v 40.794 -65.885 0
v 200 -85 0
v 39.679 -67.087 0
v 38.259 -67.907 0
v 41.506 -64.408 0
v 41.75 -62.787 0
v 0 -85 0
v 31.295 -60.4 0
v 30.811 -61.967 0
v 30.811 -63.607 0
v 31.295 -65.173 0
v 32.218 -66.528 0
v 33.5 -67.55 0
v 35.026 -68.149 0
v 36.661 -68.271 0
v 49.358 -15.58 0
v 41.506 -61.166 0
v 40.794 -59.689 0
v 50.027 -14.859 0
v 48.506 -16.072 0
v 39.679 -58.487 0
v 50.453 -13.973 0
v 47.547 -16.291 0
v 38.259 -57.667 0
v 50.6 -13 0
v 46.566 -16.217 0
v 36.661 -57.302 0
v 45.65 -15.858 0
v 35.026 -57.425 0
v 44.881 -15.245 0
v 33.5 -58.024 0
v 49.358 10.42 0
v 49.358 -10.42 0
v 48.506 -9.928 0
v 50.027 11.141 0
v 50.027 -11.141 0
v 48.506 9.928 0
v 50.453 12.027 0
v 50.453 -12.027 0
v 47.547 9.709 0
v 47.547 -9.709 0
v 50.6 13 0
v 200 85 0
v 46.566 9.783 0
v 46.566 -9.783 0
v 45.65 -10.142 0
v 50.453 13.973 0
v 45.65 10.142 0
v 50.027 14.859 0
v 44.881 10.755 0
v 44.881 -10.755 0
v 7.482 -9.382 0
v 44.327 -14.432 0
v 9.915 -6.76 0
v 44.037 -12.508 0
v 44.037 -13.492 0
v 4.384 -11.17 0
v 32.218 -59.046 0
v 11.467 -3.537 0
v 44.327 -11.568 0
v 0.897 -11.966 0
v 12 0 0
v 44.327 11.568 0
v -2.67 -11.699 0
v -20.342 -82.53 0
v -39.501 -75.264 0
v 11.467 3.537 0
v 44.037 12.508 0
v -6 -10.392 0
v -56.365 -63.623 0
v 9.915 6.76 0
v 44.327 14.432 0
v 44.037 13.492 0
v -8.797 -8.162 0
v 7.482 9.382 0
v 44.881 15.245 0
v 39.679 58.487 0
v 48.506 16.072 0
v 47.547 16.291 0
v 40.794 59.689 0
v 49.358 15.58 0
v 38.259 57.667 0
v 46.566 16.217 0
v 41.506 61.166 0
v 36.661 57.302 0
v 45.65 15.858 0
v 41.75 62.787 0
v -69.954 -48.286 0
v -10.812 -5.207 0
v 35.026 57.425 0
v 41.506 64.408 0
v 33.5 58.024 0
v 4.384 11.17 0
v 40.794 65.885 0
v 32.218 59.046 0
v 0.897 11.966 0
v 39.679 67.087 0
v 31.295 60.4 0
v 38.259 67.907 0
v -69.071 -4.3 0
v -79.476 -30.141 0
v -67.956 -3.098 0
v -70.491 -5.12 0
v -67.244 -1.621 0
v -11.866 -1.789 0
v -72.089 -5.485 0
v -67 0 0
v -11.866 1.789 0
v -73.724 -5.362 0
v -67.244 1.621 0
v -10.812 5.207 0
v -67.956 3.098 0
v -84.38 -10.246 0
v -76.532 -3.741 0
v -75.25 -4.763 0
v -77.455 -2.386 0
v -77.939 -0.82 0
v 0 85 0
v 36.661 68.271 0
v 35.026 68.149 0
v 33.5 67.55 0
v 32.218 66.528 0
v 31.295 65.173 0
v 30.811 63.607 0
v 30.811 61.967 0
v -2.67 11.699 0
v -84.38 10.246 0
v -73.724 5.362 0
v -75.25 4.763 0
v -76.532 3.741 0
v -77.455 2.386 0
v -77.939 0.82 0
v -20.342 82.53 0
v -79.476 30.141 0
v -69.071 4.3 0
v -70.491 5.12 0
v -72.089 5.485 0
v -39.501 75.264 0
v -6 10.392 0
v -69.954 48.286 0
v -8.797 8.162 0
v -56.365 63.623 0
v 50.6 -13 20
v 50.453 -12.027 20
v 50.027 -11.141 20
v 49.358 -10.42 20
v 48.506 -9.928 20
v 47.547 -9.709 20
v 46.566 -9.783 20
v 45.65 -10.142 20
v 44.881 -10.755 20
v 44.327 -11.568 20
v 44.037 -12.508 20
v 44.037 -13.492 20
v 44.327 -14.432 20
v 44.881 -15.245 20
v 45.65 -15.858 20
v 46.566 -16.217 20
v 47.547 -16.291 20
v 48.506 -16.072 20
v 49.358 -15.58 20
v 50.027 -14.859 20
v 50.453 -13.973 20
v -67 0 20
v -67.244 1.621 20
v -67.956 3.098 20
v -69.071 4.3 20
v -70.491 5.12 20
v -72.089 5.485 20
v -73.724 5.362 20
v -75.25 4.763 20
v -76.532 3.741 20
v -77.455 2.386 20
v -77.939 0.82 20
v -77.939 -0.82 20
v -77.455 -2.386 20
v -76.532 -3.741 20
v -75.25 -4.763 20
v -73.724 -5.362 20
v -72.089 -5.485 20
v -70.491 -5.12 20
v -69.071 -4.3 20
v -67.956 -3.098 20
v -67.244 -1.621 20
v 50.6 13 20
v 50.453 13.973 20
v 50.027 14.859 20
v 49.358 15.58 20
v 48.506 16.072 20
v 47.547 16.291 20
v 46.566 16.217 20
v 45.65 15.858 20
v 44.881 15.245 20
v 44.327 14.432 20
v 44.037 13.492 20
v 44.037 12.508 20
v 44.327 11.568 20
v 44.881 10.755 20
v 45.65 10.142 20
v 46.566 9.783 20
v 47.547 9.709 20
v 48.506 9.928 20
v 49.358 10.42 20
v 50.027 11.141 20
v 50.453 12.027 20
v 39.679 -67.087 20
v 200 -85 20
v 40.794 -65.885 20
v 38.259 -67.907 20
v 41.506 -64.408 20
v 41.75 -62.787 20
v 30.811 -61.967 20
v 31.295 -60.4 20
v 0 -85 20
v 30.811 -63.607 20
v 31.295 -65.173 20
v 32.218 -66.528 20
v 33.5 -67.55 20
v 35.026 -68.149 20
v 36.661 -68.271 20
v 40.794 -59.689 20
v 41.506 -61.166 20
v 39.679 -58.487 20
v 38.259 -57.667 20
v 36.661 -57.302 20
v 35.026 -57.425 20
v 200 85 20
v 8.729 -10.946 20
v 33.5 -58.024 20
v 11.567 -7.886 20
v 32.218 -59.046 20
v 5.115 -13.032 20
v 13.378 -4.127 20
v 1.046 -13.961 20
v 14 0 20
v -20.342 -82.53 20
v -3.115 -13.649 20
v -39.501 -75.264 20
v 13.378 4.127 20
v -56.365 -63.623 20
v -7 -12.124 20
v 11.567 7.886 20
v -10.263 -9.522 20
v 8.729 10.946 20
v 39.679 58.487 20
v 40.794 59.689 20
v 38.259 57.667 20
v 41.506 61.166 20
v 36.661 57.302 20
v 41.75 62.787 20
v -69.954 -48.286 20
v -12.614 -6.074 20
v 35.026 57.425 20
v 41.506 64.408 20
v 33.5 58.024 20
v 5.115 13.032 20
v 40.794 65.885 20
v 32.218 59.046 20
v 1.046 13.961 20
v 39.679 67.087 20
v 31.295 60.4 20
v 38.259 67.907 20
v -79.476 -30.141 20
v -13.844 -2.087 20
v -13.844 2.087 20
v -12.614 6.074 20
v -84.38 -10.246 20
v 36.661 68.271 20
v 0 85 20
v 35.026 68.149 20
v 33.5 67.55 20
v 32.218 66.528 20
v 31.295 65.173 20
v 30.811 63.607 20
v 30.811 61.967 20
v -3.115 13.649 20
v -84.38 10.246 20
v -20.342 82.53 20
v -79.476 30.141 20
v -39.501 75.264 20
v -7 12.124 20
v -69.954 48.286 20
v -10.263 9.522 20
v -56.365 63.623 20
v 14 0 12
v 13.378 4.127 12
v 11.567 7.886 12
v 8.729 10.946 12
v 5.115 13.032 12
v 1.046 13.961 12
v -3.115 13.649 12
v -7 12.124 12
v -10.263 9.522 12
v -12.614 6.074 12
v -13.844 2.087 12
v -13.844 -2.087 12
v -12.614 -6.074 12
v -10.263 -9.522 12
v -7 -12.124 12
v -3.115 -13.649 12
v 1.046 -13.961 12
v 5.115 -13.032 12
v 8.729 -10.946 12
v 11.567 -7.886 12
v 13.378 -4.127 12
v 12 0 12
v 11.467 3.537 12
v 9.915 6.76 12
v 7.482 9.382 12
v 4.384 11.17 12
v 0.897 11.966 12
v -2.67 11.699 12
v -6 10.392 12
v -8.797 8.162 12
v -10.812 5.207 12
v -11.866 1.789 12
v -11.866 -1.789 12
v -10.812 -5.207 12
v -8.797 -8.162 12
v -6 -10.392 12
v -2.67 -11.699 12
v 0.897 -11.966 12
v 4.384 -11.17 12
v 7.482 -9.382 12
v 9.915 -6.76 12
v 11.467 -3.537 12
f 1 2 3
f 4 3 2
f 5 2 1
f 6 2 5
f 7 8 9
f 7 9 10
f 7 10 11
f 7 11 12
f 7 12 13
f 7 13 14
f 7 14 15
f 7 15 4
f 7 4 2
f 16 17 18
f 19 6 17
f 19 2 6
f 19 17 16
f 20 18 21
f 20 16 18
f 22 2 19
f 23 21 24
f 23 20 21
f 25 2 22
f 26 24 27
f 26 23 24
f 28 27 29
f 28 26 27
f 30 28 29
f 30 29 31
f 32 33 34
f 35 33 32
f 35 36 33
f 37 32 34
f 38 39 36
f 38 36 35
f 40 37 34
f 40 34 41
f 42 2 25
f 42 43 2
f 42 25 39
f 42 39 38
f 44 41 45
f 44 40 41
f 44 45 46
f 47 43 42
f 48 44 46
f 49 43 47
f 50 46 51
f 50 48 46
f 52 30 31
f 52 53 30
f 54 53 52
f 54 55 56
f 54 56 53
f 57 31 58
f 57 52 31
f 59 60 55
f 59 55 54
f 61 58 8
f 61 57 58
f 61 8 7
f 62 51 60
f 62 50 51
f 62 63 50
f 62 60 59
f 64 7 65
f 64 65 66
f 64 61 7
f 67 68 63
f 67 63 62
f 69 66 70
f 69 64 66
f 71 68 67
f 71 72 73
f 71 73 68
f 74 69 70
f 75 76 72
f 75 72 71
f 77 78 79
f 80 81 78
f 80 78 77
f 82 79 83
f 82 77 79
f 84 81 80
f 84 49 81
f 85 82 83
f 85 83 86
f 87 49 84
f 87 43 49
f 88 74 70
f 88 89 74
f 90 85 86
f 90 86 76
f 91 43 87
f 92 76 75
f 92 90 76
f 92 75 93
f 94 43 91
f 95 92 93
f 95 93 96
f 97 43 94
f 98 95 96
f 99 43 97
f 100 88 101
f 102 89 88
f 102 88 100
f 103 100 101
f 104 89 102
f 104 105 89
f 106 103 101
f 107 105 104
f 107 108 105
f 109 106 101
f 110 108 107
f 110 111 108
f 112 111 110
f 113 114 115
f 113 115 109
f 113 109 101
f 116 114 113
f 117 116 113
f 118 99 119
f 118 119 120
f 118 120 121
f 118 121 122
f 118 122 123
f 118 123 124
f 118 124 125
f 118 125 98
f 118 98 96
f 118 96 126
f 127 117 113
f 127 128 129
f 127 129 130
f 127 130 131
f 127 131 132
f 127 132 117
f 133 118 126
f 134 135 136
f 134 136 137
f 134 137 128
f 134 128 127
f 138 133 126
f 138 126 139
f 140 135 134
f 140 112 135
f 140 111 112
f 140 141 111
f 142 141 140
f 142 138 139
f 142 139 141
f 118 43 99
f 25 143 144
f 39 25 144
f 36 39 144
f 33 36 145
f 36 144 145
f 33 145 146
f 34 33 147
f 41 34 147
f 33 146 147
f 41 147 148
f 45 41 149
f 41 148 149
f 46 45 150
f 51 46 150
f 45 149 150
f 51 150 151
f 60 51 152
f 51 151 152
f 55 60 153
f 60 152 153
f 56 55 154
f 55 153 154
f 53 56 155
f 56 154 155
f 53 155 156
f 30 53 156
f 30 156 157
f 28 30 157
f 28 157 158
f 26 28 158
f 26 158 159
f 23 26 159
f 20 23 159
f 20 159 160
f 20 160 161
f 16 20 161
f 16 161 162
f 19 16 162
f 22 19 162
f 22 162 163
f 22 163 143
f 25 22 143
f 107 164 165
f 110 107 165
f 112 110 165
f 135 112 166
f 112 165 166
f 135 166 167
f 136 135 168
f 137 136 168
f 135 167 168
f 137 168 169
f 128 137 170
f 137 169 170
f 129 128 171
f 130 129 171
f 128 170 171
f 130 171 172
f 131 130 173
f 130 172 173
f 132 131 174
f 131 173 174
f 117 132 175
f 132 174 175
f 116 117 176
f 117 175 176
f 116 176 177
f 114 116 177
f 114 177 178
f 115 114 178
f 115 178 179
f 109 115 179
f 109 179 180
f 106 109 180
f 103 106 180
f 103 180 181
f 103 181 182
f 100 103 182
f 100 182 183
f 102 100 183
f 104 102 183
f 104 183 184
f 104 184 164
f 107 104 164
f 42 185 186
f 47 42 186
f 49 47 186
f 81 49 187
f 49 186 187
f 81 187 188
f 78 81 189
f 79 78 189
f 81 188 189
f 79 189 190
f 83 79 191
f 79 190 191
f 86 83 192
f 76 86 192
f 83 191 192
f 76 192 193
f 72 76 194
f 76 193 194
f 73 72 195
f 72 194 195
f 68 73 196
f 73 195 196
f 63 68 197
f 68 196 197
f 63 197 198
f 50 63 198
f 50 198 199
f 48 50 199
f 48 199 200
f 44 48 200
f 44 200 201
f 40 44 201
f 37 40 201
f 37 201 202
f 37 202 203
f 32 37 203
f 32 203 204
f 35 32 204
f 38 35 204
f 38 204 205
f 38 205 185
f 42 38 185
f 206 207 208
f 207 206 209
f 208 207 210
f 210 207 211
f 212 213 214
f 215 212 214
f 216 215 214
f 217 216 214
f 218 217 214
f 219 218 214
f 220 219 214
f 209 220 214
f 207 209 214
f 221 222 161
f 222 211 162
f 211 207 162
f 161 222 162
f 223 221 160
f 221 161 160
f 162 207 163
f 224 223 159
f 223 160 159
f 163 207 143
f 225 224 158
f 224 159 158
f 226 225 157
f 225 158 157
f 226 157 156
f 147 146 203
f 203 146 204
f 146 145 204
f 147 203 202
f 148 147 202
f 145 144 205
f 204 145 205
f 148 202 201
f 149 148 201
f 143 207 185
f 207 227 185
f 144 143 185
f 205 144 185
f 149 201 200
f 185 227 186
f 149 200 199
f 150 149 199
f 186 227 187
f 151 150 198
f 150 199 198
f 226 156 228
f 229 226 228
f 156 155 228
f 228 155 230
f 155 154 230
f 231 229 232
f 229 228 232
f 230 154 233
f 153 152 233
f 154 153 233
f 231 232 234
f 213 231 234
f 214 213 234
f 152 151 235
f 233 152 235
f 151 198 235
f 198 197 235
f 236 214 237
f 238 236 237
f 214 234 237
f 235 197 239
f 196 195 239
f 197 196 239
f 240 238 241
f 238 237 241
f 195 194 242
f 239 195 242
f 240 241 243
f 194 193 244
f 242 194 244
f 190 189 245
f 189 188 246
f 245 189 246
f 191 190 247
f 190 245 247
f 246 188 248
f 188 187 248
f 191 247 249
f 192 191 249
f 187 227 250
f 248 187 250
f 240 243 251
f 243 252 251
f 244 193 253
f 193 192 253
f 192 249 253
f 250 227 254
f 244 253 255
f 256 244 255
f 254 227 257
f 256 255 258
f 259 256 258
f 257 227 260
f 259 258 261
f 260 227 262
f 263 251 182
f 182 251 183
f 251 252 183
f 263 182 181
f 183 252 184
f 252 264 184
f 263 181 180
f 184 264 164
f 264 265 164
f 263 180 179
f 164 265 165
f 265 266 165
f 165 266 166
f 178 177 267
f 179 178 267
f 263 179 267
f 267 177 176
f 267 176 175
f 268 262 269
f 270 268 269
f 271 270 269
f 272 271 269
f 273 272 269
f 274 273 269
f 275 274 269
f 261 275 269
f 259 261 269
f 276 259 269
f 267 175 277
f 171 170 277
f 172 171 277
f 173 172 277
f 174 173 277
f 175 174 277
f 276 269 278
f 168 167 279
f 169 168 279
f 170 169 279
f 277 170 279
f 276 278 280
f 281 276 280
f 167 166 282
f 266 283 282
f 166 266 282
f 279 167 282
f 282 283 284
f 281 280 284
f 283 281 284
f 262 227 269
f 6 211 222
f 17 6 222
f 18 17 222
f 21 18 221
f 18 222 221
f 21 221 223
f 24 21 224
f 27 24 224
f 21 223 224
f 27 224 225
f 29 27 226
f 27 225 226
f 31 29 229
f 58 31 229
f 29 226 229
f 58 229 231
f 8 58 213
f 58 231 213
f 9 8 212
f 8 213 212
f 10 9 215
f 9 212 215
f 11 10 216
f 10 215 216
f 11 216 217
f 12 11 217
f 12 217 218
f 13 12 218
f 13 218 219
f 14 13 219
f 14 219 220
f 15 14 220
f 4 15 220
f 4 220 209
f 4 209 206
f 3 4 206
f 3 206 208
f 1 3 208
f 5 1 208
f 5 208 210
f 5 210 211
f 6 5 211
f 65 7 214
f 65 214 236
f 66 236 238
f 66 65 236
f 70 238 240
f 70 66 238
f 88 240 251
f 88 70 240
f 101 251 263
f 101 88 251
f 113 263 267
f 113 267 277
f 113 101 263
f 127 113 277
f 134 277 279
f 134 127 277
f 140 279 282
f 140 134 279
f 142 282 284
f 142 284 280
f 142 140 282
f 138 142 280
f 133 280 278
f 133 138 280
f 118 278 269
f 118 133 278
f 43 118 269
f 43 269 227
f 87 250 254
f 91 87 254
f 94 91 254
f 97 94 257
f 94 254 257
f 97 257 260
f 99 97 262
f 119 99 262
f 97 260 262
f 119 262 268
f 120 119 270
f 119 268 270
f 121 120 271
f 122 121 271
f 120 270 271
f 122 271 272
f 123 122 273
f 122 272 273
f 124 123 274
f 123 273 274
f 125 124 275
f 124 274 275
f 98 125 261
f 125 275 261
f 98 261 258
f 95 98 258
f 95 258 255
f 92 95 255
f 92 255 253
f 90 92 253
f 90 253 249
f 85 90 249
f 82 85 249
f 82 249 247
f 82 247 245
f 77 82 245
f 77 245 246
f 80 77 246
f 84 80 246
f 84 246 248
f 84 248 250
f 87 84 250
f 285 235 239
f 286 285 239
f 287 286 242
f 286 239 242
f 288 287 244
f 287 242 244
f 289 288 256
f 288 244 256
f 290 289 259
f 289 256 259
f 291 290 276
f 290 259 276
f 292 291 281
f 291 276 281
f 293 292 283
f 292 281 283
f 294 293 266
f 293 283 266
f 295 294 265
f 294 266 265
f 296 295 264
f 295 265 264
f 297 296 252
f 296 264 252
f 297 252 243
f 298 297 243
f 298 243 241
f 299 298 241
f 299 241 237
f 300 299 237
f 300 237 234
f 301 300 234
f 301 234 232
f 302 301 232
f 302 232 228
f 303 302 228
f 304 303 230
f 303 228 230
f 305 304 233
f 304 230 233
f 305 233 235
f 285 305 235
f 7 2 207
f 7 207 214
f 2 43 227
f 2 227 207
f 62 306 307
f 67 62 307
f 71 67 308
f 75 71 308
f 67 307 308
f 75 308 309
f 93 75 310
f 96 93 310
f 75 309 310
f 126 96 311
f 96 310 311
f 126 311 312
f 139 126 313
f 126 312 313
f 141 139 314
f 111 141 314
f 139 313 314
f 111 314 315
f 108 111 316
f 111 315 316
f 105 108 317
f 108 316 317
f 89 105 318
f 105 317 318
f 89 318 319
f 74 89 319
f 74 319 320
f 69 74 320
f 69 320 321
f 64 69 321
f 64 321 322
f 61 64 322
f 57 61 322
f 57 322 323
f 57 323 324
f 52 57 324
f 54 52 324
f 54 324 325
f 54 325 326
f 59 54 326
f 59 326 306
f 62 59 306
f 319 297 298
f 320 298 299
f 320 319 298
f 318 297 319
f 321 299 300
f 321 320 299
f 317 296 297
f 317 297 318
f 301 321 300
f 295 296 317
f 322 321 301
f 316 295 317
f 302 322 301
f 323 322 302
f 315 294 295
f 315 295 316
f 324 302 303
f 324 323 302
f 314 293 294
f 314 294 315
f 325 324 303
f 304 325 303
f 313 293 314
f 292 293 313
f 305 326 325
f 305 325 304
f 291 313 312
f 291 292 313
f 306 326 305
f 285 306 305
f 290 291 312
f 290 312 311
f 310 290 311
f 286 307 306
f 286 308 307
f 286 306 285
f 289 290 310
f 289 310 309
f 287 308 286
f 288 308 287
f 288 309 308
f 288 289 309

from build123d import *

# Parameters (mm, degrees)
EXTRUDE_1_DEPTH     = 20
SKETCH_2_R          = 14
CUT_EXTRUDE_1_DEPTH = 8
SKETCH_3_R          = 12
CUT_EXTRUDE_2_DEPTH = 218.644205069
SKETCH_4_R          = 5.5
CUT_EXTRUDE_3_DEPTH = 219.231528428
SKETCH_6_R          = 3.3
CUT_EXTRUDE_4_DEPTH = 219.231528428


with BuildPart() as part:
    # 草图1 → 凸台-拉伸1 (new body)
    with BuildSketch(Plane.XY):
        with BuildLine():
            Line((0, 85), (200, 85))
            Line((200, 85), (200, -85))
            Line((200, -85), (0, -85))
            ThreePointArc((0, -85), (-85, 0), (0, 85))
        make_face()
    extrude(amount=EXTRUDE_1_DEPTH)

    # 草图2 → 切除-拉伸1 (cut)
    with BuildSketch(Plane.XY.offset(20)):
        Circle(SKETCH_2_R)
    extrude(amount=-CUT_EXTRUDE_1_DEPTH, mode=Mode.SUBTRACT)

    # 草图3 → 切除-拉伸2 (cut, through all)
    with BuildSketch(Plane.XY.offset(12)):
        Circle(SKETCH_3_R)
    extrude(amount=-CUT_EXTRUDE_2_DEPTH, mode=Mode.SUBTRACT)

    # 草图4 → 切除-拉伸3 (cut, through all)
    with BuildSketch(Plane.XY.offset(20)):
        with Locations((-72.5, 0)):
            Circle(SKETCH_4_R)
        with Locations((36.25, 62.786841774)):
            Circle(SKETCH_4_R)
        with Locations((36.25, -62.786841774)):
            Circle(SKETCH_4_R)
    extrude(amount=-CUT_EXTRUDE_3_DEPTH, mode=Mode.SUBTRACT)

    # 草图6 → 切除-拉伸4 (cut, through all)
    with BuildSketch(Plane.XY.offset(20)):
        with Locations((47.3, 13)):
            Circle(SKETCH_6_R)
        with Locations((47.3, -13)):
            Circle(SKETCH_6_R)
    extrude(amount=-CUT_EXTRUDE_4_DEPTH, mode=Mode.SUBTRACT)


solid = part.part
